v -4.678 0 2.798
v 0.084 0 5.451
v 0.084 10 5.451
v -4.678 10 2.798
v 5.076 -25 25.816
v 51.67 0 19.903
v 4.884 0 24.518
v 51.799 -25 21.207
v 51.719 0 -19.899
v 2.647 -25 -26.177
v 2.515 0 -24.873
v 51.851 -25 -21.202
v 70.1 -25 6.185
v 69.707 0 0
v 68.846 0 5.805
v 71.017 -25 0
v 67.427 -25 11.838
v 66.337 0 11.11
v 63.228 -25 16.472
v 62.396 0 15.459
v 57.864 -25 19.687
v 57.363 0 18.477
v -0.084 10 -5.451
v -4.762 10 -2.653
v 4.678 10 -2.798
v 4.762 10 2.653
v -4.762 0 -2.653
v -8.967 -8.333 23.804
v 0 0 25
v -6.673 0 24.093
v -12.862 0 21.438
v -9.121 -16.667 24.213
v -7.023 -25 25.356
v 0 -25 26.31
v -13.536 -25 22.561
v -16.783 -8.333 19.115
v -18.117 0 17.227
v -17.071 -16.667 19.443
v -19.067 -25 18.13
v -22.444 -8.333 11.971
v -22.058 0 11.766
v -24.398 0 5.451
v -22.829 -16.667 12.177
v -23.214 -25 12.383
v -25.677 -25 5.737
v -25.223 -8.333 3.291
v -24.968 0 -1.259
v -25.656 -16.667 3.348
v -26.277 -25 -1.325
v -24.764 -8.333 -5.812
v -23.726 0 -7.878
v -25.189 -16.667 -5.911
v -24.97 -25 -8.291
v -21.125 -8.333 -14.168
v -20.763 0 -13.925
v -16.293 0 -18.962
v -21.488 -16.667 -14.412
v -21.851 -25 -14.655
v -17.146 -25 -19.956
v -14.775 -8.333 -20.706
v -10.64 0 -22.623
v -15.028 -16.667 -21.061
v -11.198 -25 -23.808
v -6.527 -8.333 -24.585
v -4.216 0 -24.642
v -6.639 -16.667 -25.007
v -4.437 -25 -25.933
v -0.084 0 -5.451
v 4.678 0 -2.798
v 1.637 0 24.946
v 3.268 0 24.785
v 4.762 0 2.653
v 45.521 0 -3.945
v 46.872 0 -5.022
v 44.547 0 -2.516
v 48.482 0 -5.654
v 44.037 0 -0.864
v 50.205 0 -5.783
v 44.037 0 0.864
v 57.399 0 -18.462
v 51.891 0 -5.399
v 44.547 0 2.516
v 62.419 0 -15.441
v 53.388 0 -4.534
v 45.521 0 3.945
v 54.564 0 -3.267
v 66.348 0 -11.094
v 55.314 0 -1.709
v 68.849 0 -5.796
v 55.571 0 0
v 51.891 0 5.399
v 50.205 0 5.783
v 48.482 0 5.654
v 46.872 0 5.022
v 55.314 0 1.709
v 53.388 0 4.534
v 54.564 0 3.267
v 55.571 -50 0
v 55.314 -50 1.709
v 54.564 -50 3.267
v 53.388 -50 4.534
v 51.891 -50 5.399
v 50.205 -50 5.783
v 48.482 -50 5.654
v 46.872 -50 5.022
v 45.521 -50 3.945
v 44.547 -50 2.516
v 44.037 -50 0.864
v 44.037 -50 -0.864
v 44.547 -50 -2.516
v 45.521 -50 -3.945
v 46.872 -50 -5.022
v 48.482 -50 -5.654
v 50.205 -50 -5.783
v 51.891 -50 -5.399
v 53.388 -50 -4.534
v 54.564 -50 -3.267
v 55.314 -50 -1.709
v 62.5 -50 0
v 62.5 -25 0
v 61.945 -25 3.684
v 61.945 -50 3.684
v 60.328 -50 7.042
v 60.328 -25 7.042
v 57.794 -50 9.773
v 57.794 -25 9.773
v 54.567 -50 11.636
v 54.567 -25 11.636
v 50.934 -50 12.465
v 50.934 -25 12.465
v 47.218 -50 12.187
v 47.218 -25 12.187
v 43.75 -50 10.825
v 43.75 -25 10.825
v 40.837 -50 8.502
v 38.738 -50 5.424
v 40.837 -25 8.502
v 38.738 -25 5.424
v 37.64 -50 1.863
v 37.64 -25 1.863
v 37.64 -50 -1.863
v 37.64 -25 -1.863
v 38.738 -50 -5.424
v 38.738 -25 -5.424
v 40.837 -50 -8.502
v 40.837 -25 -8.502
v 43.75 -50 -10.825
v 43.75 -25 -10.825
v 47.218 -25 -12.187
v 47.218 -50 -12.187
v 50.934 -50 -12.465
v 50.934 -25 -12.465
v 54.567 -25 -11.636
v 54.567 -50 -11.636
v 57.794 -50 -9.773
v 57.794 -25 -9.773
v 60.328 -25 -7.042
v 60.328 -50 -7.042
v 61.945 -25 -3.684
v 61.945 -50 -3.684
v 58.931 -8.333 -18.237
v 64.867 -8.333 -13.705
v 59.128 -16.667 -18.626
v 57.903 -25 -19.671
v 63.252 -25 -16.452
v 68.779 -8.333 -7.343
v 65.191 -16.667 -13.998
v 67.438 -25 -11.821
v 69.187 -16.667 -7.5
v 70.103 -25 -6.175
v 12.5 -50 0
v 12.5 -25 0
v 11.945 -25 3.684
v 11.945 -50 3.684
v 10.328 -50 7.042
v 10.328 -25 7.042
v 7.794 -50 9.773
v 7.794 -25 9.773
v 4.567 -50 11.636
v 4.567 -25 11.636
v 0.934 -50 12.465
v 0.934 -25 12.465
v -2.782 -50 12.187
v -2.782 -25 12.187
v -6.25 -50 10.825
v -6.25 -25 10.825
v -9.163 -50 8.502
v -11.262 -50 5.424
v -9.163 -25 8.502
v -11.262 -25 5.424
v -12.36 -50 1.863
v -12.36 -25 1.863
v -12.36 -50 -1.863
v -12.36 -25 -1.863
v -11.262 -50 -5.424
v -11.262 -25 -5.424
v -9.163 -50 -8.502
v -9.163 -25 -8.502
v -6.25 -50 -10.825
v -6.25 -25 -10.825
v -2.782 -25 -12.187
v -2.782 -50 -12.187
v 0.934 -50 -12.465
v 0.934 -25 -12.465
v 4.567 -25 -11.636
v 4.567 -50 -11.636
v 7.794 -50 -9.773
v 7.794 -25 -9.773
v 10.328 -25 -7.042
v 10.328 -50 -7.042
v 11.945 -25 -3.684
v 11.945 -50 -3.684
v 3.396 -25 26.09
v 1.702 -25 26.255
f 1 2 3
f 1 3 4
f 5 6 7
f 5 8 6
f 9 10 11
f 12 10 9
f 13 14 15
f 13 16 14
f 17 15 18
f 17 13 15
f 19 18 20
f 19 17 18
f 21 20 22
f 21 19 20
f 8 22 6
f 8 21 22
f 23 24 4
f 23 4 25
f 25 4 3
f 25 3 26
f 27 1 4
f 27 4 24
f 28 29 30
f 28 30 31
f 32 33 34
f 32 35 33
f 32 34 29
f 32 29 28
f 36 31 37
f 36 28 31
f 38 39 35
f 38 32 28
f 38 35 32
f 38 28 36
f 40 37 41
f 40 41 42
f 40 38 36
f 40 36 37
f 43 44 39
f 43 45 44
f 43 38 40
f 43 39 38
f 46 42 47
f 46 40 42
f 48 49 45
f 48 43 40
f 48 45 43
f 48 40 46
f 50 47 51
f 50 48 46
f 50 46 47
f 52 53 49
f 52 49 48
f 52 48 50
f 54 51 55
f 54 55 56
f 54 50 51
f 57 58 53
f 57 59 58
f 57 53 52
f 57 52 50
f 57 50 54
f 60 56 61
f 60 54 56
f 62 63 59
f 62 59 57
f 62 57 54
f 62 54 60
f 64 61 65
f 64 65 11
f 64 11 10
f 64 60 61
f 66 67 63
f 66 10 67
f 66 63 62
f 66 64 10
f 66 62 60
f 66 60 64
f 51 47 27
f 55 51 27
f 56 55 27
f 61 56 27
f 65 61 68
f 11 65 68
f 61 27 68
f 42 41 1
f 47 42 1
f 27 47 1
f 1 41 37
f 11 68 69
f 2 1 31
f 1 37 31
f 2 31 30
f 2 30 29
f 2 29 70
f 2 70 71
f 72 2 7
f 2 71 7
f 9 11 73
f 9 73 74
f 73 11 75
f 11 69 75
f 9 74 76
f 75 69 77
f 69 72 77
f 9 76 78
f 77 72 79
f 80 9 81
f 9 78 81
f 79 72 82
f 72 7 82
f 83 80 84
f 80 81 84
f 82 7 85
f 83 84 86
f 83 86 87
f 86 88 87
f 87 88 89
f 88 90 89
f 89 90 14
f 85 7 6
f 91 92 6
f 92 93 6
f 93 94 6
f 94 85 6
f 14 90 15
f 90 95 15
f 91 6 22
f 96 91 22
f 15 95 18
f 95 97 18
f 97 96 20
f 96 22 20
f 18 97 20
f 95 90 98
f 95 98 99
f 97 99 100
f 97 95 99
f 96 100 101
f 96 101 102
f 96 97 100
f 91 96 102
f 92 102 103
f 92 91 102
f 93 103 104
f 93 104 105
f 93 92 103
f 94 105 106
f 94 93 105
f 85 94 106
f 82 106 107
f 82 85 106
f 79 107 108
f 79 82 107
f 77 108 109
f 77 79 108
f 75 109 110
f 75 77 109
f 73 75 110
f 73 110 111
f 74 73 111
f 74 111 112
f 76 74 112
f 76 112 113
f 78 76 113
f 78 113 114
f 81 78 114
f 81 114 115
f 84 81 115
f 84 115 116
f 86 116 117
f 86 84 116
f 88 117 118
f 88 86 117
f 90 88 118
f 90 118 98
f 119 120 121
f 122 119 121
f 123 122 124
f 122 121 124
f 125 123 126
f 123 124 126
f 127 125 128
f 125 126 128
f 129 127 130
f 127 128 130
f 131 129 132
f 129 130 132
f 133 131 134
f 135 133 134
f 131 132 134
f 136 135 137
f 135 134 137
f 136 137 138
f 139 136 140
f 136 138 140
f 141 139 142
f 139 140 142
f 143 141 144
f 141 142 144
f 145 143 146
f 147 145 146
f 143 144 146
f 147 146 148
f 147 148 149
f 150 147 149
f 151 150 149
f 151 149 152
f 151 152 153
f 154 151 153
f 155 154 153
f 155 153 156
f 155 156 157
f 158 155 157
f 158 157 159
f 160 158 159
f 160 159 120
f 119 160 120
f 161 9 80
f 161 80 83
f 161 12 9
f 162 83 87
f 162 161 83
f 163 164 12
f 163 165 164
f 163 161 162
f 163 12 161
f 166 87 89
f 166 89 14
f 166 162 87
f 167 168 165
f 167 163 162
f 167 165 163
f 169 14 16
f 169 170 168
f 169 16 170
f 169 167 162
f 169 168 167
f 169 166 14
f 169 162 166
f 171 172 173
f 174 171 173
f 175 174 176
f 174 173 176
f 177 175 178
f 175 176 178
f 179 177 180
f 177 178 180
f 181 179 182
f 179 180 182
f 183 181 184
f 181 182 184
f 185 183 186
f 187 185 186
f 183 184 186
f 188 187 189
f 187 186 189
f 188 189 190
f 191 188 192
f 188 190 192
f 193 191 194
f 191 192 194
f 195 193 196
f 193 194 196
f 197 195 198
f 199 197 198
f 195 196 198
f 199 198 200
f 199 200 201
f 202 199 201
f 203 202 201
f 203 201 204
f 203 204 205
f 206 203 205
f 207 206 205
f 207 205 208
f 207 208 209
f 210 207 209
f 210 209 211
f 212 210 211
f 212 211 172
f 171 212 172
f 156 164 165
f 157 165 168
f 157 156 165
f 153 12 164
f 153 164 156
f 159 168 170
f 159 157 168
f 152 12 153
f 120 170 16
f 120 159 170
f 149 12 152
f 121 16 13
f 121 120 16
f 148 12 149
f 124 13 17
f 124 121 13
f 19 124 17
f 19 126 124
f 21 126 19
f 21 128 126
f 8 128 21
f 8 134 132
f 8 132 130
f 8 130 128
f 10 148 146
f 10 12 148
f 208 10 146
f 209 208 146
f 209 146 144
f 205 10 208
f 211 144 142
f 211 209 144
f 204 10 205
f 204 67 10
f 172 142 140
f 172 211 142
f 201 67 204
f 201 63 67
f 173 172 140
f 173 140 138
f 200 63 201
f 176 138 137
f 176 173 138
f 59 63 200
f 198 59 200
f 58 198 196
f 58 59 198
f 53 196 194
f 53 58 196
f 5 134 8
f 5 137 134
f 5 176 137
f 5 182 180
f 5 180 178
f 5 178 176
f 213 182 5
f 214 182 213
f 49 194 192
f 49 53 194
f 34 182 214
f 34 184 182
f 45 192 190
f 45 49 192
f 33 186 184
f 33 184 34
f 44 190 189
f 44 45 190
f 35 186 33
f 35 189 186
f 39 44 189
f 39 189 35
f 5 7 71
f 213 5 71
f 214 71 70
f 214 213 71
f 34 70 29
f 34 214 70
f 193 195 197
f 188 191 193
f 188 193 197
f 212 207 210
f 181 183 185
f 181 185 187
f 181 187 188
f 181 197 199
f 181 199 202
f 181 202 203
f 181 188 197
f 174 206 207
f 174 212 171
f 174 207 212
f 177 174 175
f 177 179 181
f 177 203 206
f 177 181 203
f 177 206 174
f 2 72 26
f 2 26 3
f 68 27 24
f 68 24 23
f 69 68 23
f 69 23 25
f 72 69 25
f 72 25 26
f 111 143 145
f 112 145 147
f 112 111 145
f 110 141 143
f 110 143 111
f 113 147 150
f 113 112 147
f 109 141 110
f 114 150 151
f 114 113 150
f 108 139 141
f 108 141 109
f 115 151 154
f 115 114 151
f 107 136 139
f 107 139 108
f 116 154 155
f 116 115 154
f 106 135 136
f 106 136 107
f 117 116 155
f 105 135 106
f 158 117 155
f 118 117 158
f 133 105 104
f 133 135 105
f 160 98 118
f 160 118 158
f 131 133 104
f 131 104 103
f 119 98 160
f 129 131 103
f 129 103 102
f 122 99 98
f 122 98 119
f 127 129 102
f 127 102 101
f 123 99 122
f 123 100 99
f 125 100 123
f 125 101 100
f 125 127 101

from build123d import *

# Parameters (mm, degrees)
F1_DEPTH = 25
F1_TAPER = -3
F2_R     = 12.5
F3_DEPTH = 50
F4_R     = 5.7994178108
F5_DEPTH = 50
F7_DEPTH = 10


# Not quite as in the source:
# - a feature names something its author has since deleted; it is built from what else it names


with BuildPart() as f1:
    # F0 (on Front) → F1 (new body)
    with BuildSketch(Plane.XZ):
        with BuildLine():
            Line((4.8843180895, 24.5182266243), (0, 25))
            ThreePointArc((0, 25), (-24.9682800601, -1.2589641933), (2.5147336452, -24.8732007328))
            ThreePointArc((2.5147336452, -24.8732007328), (18.5454622635, -16.7650180267), (25, 0))
            ThreePointArc((25, 0), (19.3275444927, 15.8570496588), (4.8843180895, 24.5182266243))
        make_face()
        with BuildLine():
            ThreePointArc((4.8843180895, 24.5182266243), (2.4540104311, 24.8792651178), (0, 25))
            Line((0, 25), (4.8843180895, 24.5182266243))
        make_face()
        with BuildLine():
            ThreePointArc((25, 0), (18.5454622635, -16.7650180267), (2.5147336452, -24.8732007328))
            Line((2.5147336452, -24.8732007328), (51.7188404795, -19.8985605862))
            ThreePointArc((51.7188404795, -19.8985605862), (29.7070684597, -0.0244101143), (51.6702619082, 19.9034120943))
            Line((51.6702619082, 19.9034120943), (4.8843180895, 24.5182266243))
            ThreePointArc((4.8843180895, 24.5182266243), (19.3275444927, 15.8570496588), (25, 0))
        make_face()
        with BuildLine():
            ThreePointArc((51.6702619082, 19.9034120943), (29.7070684597, -0.0244101143), (51.7188404795, -19.8985605862))
            ThreePointArc((51.7188404795, -19.8985605862), (64.5434233741, -13.4120144213), (69.7070535633, 0))
            ThreePointArc((69.7070535633, 0), (64.5270428835, 13.430112306), (51.6702619082, 19.9034120943))
        make_face()
    extrude(amount=F1_DEPTH, taper=F1_TAPER)

    # F2 (on Front) → F3 (join)
    with BuildSketch(Plane.XZ):
        Circle(F2_R)
        with Locations((50, 0)):
            Circle(F2_R)
    extrude(amount=F3_DEPTH)

    # F4 (on Front) → F5 (cut)
    with BuildSketch(Plane.XZ):
        with Locations((49.772053957, 0)):
            Circle(F4_R)
    extrude(amount=F5_DEPTH, mode=Mode.SUBTRACT)

    # F6 (on Front) → F7 (join)
    with BuildSketch(Plane.XZ):
        Polygon((-0.0836669881, -5.4505592747), (4.6784893026, -2.7977373745), (4.7621562908, 2.6528219002), (0.0836669881, 5.4505592747), (-4.6784893026, 2.7977373745), (-4.7621562908, -2.6528219002), align=None)
    extrude(amount=-F7_DEPTH)


solid = f1.part
